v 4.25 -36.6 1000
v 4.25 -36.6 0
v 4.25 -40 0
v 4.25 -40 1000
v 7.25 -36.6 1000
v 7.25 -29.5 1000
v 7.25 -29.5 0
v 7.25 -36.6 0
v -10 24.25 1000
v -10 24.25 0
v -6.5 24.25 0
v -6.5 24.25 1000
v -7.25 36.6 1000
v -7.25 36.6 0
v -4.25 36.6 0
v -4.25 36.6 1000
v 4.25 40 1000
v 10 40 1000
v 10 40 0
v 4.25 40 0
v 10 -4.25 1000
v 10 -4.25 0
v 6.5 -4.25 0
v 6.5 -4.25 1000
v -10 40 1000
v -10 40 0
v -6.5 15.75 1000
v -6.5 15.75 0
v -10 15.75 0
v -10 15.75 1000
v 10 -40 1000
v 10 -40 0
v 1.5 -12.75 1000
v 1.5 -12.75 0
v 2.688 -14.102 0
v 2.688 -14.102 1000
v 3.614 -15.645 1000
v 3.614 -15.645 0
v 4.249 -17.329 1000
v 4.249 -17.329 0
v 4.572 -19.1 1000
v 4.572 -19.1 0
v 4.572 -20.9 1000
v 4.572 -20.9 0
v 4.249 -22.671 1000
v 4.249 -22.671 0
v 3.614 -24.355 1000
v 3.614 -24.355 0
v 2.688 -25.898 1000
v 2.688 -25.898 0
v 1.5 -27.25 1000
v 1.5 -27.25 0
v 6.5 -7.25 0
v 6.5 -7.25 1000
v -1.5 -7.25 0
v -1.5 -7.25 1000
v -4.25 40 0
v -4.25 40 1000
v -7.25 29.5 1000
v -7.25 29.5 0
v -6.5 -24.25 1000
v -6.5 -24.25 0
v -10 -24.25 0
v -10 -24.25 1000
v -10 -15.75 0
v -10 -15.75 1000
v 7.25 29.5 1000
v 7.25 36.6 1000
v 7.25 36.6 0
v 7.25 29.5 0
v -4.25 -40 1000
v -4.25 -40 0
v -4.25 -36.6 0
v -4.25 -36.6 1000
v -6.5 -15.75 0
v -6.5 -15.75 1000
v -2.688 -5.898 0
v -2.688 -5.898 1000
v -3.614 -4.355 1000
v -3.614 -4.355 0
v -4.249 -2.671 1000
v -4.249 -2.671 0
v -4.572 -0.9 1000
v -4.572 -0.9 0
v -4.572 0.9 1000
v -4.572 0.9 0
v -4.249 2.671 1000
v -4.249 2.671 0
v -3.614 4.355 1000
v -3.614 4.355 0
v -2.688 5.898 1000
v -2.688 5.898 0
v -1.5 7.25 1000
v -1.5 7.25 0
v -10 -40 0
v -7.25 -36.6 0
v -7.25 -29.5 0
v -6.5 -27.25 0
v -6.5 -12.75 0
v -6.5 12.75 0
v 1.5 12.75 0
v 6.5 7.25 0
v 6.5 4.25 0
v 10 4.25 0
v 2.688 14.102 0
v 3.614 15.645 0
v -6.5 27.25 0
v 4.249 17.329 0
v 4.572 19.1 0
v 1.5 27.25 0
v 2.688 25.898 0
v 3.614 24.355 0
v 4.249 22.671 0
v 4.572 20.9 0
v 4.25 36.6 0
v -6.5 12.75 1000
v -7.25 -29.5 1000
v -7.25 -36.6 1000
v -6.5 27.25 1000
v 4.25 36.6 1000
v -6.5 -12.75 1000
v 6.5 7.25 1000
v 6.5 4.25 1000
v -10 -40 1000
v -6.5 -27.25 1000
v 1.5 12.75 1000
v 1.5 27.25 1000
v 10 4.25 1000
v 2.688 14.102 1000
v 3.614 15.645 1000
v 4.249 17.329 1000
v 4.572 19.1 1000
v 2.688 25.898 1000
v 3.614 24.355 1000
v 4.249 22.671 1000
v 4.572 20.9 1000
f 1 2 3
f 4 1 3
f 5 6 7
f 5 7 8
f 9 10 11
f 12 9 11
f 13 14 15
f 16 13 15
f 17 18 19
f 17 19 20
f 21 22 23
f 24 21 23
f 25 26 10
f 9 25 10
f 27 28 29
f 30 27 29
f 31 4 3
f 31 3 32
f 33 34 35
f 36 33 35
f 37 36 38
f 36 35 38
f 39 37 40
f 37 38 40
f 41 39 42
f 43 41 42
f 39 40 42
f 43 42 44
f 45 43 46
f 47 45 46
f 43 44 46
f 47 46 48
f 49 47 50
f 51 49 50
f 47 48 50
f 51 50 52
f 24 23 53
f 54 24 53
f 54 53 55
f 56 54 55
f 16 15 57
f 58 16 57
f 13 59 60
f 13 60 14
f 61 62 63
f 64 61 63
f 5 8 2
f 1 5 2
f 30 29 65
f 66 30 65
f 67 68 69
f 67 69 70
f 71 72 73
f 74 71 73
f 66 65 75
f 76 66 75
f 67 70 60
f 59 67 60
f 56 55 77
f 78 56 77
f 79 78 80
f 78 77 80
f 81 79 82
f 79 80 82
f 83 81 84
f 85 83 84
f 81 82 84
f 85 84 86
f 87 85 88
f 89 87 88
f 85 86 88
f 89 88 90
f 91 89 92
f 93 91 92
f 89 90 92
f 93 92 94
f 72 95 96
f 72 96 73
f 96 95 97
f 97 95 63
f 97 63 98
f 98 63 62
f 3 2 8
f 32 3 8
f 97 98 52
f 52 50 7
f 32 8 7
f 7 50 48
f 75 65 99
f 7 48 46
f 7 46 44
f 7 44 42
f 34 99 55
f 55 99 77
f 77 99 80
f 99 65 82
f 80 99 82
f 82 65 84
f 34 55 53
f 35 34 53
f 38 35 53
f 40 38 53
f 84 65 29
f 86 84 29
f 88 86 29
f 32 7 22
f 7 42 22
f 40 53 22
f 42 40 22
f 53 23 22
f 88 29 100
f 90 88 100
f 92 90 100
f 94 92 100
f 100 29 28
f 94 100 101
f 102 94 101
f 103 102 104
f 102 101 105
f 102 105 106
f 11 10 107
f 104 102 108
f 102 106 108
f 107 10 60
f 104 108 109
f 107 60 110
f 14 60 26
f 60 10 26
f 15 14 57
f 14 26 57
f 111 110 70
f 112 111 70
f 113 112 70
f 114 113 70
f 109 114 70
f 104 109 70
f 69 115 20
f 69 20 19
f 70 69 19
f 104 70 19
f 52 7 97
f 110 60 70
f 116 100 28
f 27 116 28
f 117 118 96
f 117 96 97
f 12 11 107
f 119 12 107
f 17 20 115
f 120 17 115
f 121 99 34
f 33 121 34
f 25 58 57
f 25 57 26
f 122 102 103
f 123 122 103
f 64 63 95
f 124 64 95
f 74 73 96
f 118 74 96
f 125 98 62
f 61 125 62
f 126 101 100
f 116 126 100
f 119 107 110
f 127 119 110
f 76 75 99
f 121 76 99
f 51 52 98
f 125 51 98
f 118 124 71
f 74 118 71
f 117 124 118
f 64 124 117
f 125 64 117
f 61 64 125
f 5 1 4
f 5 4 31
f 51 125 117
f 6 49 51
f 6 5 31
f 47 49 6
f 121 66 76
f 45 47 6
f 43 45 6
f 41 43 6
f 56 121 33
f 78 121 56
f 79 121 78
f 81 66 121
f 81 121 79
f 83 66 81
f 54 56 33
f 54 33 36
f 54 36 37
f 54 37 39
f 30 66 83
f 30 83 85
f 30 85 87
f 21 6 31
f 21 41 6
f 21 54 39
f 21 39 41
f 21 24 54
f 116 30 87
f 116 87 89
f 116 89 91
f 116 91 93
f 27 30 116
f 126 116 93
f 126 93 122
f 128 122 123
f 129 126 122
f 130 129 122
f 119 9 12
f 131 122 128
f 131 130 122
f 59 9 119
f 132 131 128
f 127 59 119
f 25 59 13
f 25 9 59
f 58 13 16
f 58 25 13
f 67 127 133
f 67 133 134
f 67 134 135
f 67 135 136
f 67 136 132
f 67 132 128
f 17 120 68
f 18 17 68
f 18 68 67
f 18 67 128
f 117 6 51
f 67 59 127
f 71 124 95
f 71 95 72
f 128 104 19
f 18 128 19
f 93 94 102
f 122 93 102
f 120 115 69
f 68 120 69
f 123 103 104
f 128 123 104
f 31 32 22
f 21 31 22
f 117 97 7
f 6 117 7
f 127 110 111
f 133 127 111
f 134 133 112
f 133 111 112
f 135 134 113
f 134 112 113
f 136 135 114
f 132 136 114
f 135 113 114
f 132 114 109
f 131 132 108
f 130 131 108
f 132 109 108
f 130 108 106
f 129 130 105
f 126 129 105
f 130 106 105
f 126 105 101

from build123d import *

# Parameters (mm, degrees)
EXTRUDE_1_DEPTH = 1000


with BuildPart() as part:
    # Эскиз1 → Бобышка-Вытянуть1 (new body)
    with BuildSketch(Plane.XY):
        with BuildLine():
            Line((-10, 40), (-10, 27.25))
            Line((-10, 27.25), (-10, 24.25))
            Line((-10, 24.25), (-6.5, 24.25))
            Line((-6.5, 24.25), (-6.5, 27.25))
            Line((-6.5, 27.25), (1.5, 27.25))
            ThreePointArc((1.5, 27.25), (4.612511343, 20), (1.5, 12.75))
            Line((1.5, 12.75), (-6.5, 12.75))
            Line((-6.5, 12.75), (-6.5, 15.75))
            Line((-6.5, 15.75), (-10, 15.75))
            Line((-10, 15.75), (-10, 12.75))
            Line((-10, 12.75), (-10, -12.75))
            Line((-10, -12.75), (-10, -15.75))
            Line((-10, -15.75), (-6.5, -15.75))
            Line((-6.5, -15.75), (-6.5, -12.75))
            Line((-6.5, -12.75), (1.5, -12.75))
            ThreePointArc((1.5, -12.75), (4.612511343, -20), (1.5, -27.25))
            Line((1.5, -27.25), (-6.5, -27.25))
            Line((-6.5, -27.25), (-6.5, -24.25))
            Line((-6.5, -24.25), (-10, -24.25))
            Line((-10, -24.25), (-10, -27.25))
            Line((-10, -27.25), (-10, -40))
            Line((-10, -40), (-4.25, -40))
            Line((-4.25, -40), (-4.25, -36.6))
            Line((-4.25, -36.6), (-7.25, -36.6))
            Line((-7.25, -36.6), (-7.25, -29.5))
            Line((-7.25, -29.5), (7.25, -29.5))
            Line((7.25, -29.5), (7.25, -36.6))
            Line((7.25, -36.6), (4.25, -36.6))
            Line((4.25, -36.6), (4.25, -40))
            Line((4.25, -40), (10, -40))
            Line((10, -40), (10, -7.25))
            Line((10, -7.25), (10, -4.25))
            Line((10, -4.25), (6.5, -4.25))
            Line((6.5, -4.25), (6.5, -7.25))
            Line((6.5, -7.25), (-1.5, -7.25))
            ThreePointArc((-1.5, -7.25), (-4.612511343, 0), (-1.5, 7.25))
            Line((-1.5, 7.25), (6.5, 7.25))
            Line((6.5, 7.25), (6.5, 4.25))
            Line((6.5, 4.25), (10, 4.25))
            Line((10, 4.25), (10, 7.25))
            Line((10, 7.25), (10, 40))
            Line((10, 40), (4.25, 40))
            Line((4.25, 40), (4.25, 36.6))
            Line((4.25, 36.6), (7.25, 36.6))
            Line((7.25, 36.6), (7.25, 29.5))
            Line((7.25, 29.5), (-7.25, 29.5))
            Line((-7.25, 29.5), (-7.25, 36.6))
            Line((-7.25, 36.6), (-4.25, 36.6))
            Line((-4.25, 36.6), (-4.25, 40))
            Line((-4.25, 40), (-10, 40))
        make_face()
    extrude(amount=EXTRUDE_1_DEPTH)


solid = part.part
